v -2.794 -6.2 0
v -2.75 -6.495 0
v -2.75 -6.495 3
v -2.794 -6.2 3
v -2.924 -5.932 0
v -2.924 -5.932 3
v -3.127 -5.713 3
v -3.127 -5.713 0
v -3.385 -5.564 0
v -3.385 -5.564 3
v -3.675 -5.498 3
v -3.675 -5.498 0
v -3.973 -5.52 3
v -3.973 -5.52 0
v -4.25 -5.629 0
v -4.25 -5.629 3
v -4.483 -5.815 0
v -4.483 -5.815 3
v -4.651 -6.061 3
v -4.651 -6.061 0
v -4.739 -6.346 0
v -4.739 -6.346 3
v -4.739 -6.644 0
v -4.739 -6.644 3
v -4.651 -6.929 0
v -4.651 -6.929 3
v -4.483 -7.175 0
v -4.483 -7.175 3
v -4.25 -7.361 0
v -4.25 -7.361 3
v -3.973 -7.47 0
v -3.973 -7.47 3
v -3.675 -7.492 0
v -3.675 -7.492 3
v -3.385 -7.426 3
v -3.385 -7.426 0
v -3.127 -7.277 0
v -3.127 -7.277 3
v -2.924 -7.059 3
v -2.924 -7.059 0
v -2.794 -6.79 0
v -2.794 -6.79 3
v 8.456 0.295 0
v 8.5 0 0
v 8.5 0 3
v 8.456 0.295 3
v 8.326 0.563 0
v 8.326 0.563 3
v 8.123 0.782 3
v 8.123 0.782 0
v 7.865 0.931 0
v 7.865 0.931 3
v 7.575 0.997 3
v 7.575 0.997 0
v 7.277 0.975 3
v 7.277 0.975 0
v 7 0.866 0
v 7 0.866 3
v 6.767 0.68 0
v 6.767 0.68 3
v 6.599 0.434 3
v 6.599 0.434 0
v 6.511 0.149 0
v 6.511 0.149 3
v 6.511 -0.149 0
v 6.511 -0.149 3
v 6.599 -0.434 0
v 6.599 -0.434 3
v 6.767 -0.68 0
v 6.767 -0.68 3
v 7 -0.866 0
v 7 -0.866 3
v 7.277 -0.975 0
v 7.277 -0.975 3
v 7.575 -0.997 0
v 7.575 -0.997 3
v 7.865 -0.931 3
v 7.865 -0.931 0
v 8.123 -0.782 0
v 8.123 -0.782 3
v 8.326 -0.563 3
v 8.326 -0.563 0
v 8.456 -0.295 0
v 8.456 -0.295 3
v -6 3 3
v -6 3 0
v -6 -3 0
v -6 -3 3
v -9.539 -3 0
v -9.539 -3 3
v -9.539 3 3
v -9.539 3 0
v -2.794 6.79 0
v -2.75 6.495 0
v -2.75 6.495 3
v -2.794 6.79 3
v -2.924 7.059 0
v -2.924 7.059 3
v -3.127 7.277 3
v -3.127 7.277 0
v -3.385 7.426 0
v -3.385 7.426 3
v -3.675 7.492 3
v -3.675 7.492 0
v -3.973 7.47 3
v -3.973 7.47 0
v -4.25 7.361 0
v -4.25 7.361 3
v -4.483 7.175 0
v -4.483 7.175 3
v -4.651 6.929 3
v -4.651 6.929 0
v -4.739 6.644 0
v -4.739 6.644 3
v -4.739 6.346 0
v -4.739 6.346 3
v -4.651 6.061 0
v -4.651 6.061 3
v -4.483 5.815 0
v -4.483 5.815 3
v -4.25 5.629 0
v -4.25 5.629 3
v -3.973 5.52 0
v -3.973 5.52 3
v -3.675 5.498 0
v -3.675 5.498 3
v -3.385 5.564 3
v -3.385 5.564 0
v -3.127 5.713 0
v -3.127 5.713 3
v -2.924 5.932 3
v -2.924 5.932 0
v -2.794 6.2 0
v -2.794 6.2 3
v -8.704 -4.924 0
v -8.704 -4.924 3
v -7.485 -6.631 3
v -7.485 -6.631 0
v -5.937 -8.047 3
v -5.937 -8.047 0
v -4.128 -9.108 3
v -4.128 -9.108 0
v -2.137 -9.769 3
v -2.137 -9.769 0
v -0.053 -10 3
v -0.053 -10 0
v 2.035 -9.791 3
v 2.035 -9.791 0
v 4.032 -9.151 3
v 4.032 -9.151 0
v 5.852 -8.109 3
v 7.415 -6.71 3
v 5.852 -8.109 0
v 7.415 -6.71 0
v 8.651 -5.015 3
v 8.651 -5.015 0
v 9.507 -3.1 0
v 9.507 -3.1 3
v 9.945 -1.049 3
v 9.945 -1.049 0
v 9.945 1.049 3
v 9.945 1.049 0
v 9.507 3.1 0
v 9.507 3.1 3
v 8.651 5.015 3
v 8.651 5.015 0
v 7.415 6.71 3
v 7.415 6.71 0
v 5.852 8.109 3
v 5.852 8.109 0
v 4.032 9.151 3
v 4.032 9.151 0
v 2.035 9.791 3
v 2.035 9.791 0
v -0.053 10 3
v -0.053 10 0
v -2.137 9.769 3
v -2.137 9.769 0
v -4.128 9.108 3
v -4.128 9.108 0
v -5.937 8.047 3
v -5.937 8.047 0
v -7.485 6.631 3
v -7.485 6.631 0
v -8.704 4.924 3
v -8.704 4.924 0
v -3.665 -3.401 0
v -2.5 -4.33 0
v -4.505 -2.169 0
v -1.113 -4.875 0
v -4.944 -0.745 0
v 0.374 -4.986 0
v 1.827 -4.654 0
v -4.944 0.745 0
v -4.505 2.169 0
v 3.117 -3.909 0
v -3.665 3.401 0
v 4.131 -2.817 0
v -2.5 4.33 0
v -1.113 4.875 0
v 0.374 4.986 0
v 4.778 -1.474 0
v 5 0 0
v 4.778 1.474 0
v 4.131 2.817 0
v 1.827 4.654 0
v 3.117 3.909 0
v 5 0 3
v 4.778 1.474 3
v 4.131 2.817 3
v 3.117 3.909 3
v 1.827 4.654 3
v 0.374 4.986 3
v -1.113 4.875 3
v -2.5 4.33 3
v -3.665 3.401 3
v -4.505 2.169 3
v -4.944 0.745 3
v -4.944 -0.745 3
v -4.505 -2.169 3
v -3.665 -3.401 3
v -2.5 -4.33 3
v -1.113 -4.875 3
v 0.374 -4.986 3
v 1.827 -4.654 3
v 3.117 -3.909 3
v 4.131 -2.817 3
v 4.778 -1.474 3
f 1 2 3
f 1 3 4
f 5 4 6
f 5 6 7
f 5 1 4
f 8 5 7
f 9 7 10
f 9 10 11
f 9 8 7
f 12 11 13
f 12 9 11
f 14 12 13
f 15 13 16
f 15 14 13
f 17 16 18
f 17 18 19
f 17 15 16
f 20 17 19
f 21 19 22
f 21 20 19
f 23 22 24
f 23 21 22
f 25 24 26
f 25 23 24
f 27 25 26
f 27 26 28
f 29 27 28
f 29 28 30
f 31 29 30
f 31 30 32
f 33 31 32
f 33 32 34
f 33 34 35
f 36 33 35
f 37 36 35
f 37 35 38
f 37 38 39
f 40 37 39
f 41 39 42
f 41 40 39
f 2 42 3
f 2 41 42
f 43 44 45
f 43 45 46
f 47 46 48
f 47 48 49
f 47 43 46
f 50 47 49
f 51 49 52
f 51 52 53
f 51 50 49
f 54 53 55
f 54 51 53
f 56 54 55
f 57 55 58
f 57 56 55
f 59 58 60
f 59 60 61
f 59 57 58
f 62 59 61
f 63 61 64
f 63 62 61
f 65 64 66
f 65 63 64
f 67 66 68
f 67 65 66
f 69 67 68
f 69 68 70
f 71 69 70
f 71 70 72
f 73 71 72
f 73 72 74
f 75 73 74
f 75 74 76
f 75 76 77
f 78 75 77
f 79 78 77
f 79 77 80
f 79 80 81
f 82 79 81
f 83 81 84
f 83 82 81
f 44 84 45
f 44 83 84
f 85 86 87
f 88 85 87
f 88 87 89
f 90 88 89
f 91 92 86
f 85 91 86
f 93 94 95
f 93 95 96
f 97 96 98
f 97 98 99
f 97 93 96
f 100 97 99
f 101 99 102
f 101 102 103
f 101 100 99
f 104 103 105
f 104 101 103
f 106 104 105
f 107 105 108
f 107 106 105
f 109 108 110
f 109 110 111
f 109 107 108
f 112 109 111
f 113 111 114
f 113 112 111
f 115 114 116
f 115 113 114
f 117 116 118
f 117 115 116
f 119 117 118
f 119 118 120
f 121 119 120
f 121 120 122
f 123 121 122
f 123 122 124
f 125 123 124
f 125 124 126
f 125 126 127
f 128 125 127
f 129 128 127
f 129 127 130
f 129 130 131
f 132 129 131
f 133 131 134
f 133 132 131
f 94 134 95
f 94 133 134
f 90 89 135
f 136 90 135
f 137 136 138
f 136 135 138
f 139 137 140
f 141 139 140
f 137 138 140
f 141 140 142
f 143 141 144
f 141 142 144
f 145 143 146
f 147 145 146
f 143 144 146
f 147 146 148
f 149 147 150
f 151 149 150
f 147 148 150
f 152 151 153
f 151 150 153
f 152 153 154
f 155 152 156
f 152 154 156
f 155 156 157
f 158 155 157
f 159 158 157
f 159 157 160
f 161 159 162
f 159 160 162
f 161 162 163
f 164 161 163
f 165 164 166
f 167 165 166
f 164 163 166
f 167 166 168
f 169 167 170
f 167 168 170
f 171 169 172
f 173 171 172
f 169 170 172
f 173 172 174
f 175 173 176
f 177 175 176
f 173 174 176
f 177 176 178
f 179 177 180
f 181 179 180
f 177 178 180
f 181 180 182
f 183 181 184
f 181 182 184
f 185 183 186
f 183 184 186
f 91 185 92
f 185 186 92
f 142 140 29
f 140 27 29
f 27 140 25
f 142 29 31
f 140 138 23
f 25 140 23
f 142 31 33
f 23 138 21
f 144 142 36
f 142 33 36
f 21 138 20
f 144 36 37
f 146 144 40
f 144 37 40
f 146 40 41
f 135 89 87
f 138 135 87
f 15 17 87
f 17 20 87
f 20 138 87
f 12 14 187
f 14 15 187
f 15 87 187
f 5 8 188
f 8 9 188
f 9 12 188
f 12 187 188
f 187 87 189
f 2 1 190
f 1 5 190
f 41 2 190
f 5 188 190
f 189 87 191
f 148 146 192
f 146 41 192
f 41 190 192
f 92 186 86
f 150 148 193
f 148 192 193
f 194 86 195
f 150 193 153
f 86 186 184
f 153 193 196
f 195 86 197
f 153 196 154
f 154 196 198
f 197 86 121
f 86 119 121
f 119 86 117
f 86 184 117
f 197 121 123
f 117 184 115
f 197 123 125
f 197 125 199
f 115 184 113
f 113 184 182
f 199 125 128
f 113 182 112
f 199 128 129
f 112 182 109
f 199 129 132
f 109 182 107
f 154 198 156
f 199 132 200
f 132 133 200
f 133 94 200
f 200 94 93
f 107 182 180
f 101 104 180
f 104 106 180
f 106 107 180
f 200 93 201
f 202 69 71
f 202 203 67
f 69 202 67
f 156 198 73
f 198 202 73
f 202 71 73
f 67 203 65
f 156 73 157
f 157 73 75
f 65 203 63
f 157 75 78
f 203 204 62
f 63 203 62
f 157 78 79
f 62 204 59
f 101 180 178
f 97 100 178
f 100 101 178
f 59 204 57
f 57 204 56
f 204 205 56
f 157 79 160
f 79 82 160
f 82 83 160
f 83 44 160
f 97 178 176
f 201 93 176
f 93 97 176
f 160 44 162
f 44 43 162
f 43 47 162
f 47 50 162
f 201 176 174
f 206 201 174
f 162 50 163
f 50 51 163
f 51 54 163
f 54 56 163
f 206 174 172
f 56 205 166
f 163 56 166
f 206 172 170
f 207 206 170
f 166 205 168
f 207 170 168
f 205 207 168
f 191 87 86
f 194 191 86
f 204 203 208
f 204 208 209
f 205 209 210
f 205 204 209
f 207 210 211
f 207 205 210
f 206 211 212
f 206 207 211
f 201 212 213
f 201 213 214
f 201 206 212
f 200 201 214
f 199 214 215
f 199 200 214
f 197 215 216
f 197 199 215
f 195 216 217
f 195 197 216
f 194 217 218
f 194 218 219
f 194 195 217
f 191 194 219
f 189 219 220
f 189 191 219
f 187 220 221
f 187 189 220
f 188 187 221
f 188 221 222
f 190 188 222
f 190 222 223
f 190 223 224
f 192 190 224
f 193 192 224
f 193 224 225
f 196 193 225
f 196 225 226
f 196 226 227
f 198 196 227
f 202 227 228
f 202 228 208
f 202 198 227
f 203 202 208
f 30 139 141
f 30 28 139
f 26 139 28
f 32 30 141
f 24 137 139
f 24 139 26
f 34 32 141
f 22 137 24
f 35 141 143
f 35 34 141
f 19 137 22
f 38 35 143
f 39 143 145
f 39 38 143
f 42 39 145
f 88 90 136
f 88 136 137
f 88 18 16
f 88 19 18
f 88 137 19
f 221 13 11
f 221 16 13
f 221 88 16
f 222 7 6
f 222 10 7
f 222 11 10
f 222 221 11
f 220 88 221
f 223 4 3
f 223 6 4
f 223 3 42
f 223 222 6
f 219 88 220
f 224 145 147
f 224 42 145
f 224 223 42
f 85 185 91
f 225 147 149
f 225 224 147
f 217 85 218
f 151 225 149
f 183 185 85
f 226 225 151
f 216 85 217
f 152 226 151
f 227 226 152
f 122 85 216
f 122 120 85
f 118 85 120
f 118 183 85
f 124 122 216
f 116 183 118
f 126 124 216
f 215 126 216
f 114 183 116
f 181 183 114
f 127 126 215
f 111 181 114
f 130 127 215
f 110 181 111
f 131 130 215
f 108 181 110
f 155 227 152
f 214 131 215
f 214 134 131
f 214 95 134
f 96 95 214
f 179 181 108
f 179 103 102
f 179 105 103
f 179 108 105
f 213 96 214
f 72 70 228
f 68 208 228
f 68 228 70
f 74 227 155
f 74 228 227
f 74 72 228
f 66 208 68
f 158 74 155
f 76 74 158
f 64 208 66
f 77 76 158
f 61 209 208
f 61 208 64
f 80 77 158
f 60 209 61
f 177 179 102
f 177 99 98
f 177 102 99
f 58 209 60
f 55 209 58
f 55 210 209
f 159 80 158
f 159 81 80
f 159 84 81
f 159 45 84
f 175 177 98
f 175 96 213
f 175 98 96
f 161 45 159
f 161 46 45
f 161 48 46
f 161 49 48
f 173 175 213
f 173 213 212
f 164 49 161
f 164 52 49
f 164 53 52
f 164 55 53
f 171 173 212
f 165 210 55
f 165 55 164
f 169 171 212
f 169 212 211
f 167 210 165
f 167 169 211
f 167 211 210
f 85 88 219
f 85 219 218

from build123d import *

# Parameters (mm, degrees)
CROQUIS1_R              = 1
CROQUIS1_R_2            = 5
SALIENTE_EXTRUIR1_DEPTH = 3


with BuildPart() as part:
    # Croquis1 → Saliente-Extruir1 (new body)
    with BuildSketch(Plane.XY):
        with BuildLine():
            Line((-9.539392014, 3), (-6, 3))
            Line((-6, 3), (-6, -3))
            Line((-6, -3), (-9.539392014, -3))
            ThreePointArc((-9.539392014, -3), (10, 0), (-9.539392014, 3))
        make_face()
        with Locations((-3.75, -6.495190528)):
            Circle(CROQUIS1_R, mode=Mode.SUBTRACT)
        with Locations((7.5, 0)):
            Circle(CROQUIS1_R, mode=Mode.SUBTRACT)
        Circle(CROQUIS1_R_2, mode=Mode.SUBTRACT)
        with Locations((-3.75, 6.495190528)):
            Circle(CROQUIS1_R, mode=Mode.SUBTRACT)
    extrude(amount=SALIENTE_EXTRUIR1_DEPTH)


solid = part.part
